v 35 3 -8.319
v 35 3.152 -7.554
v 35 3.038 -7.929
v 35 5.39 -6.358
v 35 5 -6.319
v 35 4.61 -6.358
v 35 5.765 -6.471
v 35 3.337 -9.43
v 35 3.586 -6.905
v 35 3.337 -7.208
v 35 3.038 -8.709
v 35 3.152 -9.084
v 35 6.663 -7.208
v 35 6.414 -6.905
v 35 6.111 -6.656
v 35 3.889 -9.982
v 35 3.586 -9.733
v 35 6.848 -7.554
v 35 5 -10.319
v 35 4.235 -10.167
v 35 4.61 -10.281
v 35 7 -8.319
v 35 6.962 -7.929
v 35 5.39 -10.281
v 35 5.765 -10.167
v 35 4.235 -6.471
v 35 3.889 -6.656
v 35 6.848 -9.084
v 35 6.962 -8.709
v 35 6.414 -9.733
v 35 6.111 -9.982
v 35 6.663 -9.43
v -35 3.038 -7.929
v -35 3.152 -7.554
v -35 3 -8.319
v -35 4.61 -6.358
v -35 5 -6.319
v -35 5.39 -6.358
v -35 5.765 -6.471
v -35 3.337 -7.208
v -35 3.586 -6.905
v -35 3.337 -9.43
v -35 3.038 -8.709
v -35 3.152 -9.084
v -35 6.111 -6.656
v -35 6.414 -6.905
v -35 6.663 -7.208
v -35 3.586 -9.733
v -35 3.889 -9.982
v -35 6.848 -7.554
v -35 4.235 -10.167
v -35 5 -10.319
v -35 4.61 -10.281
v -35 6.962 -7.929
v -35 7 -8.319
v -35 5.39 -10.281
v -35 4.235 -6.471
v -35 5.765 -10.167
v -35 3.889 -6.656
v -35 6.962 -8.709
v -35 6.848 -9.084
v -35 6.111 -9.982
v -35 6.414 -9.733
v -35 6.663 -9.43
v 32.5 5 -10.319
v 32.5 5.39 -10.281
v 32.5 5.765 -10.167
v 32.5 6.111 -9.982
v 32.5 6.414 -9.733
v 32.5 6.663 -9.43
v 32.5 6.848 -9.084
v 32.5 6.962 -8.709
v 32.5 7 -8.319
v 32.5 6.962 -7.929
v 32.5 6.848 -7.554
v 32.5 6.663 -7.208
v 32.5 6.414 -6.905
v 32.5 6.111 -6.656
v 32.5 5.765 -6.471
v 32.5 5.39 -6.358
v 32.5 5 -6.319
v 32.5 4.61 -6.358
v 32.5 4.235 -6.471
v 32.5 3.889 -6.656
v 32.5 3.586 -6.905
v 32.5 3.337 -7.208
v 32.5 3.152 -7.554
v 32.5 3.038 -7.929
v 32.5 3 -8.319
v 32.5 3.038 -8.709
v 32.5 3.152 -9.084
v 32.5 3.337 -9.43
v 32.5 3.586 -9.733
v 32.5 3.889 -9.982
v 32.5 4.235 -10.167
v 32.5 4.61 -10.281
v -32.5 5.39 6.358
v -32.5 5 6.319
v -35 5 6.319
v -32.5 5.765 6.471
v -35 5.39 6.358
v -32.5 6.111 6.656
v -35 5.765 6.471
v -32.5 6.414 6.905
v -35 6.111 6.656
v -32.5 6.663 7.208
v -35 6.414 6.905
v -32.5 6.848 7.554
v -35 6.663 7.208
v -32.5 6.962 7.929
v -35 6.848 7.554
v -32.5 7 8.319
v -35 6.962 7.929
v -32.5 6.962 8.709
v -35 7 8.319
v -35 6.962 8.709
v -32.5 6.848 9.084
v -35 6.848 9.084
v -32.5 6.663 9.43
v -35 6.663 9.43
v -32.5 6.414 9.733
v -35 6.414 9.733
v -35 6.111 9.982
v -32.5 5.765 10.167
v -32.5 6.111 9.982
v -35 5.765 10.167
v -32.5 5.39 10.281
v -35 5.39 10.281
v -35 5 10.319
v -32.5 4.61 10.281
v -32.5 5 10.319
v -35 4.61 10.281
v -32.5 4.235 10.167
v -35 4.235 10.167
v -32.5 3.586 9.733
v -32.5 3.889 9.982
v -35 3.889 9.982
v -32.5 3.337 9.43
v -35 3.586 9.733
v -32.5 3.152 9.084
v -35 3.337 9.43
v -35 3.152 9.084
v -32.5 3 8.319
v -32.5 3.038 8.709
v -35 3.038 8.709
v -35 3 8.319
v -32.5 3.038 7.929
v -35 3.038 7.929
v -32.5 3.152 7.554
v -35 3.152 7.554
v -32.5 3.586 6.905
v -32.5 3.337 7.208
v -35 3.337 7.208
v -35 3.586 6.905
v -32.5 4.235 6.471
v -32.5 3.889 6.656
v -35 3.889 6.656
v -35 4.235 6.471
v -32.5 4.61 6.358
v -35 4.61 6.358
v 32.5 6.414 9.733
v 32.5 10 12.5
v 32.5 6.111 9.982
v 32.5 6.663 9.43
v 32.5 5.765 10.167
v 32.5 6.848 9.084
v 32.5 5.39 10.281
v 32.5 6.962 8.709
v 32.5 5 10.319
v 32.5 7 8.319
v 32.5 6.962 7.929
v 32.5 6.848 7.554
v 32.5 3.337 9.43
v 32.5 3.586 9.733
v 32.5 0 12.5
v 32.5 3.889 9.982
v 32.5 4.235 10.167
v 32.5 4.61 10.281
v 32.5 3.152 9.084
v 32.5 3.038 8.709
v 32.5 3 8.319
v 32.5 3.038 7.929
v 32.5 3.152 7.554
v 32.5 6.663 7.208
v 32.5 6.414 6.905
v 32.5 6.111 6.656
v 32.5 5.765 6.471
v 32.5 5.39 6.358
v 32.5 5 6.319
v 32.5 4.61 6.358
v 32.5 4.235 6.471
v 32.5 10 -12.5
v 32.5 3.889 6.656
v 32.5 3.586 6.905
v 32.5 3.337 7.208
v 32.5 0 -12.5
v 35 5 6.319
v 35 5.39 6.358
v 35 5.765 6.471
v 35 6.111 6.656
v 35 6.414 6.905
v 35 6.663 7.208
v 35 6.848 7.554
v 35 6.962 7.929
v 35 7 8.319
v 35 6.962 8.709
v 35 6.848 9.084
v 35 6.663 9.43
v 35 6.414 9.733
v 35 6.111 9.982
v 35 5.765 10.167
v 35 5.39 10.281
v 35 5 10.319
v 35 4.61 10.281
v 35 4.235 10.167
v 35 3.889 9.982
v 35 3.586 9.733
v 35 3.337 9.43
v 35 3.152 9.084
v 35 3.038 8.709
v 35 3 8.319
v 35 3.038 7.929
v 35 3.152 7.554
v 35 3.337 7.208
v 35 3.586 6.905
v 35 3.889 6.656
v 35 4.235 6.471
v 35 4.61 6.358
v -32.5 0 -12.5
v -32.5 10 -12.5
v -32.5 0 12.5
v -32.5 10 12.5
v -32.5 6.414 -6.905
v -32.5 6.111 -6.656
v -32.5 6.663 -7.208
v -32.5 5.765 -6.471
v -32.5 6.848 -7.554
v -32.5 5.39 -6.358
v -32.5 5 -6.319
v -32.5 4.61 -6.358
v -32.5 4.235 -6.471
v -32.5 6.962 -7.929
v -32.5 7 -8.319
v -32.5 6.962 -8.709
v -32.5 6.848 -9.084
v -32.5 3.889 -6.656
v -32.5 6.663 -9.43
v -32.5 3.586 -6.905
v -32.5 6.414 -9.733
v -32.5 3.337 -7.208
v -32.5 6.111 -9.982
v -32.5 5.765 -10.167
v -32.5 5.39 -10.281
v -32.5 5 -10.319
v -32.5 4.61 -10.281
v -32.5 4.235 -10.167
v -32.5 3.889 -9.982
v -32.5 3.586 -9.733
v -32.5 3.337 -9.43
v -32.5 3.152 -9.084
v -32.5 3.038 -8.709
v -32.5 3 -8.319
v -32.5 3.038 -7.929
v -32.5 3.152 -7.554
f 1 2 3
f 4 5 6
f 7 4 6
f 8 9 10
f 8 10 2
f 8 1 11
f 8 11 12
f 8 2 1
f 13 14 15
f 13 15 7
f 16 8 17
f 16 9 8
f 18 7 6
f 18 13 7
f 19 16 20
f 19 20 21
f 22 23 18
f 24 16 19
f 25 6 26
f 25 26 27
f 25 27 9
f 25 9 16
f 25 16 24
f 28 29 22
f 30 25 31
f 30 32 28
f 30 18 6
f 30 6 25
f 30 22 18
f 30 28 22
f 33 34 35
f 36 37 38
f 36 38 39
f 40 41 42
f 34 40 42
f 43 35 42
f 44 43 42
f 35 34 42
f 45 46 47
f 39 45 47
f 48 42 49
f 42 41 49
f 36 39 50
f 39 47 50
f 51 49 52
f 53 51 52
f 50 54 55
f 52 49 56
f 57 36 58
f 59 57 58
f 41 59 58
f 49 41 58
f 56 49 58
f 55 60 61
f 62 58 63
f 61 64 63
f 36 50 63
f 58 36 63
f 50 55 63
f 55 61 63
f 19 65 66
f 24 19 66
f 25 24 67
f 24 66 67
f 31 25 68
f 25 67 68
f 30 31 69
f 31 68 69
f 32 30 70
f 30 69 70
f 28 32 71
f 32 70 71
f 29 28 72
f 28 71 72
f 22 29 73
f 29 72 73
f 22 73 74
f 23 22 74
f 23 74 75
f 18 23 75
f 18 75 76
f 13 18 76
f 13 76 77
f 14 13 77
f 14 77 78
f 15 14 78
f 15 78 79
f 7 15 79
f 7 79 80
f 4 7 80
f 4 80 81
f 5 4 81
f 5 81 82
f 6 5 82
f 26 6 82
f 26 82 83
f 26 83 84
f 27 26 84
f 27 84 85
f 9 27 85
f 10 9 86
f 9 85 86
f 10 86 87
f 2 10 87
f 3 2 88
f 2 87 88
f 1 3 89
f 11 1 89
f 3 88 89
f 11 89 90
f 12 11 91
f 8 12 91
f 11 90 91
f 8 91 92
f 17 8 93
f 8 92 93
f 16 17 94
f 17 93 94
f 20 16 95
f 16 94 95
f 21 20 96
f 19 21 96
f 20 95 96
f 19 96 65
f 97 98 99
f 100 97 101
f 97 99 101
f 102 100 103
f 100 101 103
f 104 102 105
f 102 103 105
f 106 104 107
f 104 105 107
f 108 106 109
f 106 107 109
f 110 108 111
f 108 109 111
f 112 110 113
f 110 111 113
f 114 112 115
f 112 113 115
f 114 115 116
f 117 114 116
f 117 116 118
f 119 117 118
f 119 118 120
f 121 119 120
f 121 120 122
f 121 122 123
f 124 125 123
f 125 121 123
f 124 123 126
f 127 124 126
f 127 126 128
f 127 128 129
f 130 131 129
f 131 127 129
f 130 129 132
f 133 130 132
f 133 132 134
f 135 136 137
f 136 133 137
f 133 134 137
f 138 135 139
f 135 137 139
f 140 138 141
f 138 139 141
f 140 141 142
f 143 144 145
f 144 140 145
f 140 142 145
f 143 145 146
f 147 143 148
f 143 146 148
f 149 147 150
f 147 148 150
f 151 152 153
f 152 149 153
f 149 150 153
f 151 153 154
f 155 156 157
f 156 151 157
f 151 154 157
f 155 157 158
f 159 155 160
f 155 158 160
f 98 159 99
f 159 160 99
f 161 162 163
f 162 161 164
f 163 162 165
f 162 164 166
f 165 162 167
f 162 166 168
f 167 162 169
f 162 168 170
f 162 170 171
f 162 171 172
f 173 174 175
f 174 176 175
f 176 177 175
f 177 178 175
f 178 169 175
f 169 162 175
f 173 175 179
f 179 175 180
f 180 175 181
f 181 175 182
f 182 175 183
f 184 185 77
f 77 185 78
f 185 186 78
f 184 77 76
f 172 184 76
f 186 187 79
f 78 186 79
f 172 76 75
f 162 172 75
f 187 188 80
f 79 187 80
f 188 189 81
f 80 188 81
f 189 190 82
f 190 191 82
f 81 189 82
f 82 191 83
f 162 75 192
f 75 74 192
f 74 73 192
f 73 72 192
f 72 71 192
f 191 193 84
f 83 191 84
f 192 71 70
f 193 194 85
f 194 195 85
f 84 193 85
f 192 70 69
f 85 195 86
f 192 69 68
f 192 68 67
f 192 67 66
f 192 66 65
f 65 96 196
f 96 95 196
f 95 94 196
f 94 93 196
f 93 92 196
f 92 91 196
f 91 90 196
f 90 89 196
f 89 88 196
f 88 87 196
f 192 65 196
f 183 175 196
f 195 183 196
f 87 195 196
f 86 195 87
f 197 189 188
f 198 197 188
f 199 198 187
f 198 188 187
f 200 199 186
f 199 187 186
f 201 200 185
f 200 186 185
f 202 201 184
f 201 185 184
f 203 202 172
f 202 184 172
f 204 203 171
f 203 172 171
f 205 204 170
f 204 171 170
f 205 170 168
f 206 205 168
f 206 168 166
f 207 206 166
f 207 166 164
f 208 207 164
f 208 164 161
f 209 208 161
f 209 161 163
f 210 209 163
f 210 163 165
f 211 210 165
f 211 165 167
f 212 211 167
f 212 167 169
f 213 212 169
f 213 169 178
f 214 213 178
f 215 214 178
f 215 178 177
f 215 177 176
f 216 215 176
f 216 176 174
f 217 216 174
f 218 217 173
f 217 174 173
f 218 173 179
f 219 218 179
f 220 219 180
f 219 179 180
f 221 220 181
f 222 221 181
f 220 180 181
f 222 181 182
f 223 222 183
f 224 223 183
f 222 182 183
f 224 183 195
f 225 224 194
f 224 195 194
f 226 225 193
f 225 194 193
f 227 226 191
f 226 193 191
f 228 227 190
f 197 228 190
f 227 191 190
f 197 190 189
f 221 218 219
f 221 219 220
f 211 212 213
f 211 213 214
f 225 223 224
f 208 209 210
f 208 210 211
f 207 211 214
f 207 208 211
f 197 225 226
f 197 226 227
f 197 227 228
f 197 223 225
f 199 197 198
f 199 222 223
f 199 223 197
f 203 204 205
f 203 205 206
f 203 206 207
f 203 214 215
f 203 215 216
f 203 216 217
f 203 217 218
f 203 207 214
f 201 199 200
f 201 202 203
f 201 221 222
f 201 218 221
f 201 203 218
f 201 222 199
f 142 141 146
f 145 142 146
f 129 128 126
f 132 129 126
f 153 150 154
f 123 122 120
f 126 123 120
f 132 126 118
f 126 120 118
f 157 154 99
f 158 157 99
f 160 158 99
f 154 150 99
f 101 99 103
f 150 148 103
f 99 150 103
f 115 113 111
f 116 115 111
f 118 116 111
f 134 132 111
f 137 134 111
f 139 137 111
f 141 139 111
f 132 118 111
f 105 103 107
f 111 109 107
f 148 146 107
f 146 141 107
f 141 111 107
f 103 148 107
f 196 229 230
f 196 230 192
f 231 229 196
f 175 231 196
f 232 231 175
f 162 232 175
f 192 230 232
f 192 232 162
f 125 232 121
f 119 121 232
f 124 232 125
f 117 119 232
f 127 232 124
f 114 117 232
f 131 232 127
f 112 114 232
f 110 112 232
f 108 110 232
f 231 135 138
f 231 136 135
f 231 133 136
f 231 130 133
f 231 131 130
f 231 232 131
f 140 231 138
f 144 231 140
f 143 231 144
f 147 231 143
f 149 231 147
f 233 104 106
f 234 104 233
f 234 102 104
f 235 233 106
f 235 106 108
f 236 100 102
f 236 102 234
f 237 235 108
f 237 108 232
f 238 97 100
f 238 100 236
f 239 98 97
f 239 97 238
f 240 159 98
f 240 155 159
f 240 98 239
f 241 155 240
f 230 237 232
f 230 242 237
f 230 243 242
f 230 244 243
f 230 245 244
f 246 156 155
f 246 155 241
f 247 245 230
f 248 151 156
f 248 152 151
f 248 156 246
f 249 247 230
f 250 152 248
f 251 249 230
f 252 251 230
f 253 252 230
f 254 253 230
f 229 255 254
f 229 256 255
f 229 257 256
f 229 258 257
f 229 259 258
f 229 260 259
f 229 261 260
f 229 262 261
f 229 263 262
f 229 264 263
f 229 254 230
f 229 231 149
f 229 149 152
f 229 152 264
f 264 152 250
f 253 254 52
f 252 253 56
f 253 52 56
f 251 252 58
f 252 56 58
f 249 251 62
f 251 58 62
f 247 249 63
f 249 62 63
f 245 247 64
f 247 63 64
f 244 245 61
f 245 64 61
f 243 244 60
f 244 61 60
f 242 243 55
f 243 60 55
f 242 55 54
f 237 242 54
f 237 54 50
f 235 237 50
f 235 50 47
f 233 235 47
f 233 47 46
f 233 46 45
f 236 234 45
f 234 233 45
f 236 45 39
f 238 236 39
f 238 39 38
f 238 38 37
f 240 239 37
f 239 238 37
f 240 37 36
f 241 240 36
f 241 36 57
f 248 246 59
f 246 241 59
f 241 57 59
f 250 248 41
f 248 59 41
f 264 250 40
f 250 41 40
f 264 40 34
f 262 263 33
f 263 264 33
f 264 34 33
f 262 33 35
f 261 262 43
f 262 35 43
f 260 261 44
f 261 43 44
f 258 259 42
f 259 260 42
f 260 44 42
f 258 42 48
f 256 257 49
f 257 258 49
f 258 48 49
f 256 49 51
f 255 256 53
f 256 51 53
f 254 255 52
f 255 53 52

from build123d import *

# Parameters (mm, degrees)
SKETCH1_W                = 65
SKETCH1_H                = 25
BOSS_EXTRUDE1_DEPTH      = 10
BOSS_EXTRUDE2_DEPTH      = 2.5
BOSS_EXTRUDE2_DEPTH_BACK = 67.5
SKETCH2_R                = 2


with BuildPart() as part:
    # Sketch1 → Boss-Extrude1 (new body)
    with BuildSketch(Plane(origin=(0, 0, 0), x_dir=(1, 0, 0), z_dir=(0, 1, 0))):
        Rectangle(SKETCH1_W, SKETCH1_H)
    extrude(amount=BOSS_EXTRUDE1_DEPTH)

    # Sketch2 → Boss-Extrude2 (add, two sides: drawn at the far end of the back side and taken through both)
    with BuildSketch(Plane(origin=(32.5, 0, 0), x_dir=(0, 0, -1), z_dir=(1, 0, 0)).offset(-BOSS_EXTRUDE2_DEPTH_BACK)):
        with Locations((-8.319077052, 5)):
            Circle(SKETCH2_R)
        with Locations((8.319077052, 5)):
            Circle(SKETCH2_R)
    extrude(amount=BOSS_EXTRUDE2_DEPTH + BOSS_EXTRUDE2_DEPTH_BACK)


solid = part.part
